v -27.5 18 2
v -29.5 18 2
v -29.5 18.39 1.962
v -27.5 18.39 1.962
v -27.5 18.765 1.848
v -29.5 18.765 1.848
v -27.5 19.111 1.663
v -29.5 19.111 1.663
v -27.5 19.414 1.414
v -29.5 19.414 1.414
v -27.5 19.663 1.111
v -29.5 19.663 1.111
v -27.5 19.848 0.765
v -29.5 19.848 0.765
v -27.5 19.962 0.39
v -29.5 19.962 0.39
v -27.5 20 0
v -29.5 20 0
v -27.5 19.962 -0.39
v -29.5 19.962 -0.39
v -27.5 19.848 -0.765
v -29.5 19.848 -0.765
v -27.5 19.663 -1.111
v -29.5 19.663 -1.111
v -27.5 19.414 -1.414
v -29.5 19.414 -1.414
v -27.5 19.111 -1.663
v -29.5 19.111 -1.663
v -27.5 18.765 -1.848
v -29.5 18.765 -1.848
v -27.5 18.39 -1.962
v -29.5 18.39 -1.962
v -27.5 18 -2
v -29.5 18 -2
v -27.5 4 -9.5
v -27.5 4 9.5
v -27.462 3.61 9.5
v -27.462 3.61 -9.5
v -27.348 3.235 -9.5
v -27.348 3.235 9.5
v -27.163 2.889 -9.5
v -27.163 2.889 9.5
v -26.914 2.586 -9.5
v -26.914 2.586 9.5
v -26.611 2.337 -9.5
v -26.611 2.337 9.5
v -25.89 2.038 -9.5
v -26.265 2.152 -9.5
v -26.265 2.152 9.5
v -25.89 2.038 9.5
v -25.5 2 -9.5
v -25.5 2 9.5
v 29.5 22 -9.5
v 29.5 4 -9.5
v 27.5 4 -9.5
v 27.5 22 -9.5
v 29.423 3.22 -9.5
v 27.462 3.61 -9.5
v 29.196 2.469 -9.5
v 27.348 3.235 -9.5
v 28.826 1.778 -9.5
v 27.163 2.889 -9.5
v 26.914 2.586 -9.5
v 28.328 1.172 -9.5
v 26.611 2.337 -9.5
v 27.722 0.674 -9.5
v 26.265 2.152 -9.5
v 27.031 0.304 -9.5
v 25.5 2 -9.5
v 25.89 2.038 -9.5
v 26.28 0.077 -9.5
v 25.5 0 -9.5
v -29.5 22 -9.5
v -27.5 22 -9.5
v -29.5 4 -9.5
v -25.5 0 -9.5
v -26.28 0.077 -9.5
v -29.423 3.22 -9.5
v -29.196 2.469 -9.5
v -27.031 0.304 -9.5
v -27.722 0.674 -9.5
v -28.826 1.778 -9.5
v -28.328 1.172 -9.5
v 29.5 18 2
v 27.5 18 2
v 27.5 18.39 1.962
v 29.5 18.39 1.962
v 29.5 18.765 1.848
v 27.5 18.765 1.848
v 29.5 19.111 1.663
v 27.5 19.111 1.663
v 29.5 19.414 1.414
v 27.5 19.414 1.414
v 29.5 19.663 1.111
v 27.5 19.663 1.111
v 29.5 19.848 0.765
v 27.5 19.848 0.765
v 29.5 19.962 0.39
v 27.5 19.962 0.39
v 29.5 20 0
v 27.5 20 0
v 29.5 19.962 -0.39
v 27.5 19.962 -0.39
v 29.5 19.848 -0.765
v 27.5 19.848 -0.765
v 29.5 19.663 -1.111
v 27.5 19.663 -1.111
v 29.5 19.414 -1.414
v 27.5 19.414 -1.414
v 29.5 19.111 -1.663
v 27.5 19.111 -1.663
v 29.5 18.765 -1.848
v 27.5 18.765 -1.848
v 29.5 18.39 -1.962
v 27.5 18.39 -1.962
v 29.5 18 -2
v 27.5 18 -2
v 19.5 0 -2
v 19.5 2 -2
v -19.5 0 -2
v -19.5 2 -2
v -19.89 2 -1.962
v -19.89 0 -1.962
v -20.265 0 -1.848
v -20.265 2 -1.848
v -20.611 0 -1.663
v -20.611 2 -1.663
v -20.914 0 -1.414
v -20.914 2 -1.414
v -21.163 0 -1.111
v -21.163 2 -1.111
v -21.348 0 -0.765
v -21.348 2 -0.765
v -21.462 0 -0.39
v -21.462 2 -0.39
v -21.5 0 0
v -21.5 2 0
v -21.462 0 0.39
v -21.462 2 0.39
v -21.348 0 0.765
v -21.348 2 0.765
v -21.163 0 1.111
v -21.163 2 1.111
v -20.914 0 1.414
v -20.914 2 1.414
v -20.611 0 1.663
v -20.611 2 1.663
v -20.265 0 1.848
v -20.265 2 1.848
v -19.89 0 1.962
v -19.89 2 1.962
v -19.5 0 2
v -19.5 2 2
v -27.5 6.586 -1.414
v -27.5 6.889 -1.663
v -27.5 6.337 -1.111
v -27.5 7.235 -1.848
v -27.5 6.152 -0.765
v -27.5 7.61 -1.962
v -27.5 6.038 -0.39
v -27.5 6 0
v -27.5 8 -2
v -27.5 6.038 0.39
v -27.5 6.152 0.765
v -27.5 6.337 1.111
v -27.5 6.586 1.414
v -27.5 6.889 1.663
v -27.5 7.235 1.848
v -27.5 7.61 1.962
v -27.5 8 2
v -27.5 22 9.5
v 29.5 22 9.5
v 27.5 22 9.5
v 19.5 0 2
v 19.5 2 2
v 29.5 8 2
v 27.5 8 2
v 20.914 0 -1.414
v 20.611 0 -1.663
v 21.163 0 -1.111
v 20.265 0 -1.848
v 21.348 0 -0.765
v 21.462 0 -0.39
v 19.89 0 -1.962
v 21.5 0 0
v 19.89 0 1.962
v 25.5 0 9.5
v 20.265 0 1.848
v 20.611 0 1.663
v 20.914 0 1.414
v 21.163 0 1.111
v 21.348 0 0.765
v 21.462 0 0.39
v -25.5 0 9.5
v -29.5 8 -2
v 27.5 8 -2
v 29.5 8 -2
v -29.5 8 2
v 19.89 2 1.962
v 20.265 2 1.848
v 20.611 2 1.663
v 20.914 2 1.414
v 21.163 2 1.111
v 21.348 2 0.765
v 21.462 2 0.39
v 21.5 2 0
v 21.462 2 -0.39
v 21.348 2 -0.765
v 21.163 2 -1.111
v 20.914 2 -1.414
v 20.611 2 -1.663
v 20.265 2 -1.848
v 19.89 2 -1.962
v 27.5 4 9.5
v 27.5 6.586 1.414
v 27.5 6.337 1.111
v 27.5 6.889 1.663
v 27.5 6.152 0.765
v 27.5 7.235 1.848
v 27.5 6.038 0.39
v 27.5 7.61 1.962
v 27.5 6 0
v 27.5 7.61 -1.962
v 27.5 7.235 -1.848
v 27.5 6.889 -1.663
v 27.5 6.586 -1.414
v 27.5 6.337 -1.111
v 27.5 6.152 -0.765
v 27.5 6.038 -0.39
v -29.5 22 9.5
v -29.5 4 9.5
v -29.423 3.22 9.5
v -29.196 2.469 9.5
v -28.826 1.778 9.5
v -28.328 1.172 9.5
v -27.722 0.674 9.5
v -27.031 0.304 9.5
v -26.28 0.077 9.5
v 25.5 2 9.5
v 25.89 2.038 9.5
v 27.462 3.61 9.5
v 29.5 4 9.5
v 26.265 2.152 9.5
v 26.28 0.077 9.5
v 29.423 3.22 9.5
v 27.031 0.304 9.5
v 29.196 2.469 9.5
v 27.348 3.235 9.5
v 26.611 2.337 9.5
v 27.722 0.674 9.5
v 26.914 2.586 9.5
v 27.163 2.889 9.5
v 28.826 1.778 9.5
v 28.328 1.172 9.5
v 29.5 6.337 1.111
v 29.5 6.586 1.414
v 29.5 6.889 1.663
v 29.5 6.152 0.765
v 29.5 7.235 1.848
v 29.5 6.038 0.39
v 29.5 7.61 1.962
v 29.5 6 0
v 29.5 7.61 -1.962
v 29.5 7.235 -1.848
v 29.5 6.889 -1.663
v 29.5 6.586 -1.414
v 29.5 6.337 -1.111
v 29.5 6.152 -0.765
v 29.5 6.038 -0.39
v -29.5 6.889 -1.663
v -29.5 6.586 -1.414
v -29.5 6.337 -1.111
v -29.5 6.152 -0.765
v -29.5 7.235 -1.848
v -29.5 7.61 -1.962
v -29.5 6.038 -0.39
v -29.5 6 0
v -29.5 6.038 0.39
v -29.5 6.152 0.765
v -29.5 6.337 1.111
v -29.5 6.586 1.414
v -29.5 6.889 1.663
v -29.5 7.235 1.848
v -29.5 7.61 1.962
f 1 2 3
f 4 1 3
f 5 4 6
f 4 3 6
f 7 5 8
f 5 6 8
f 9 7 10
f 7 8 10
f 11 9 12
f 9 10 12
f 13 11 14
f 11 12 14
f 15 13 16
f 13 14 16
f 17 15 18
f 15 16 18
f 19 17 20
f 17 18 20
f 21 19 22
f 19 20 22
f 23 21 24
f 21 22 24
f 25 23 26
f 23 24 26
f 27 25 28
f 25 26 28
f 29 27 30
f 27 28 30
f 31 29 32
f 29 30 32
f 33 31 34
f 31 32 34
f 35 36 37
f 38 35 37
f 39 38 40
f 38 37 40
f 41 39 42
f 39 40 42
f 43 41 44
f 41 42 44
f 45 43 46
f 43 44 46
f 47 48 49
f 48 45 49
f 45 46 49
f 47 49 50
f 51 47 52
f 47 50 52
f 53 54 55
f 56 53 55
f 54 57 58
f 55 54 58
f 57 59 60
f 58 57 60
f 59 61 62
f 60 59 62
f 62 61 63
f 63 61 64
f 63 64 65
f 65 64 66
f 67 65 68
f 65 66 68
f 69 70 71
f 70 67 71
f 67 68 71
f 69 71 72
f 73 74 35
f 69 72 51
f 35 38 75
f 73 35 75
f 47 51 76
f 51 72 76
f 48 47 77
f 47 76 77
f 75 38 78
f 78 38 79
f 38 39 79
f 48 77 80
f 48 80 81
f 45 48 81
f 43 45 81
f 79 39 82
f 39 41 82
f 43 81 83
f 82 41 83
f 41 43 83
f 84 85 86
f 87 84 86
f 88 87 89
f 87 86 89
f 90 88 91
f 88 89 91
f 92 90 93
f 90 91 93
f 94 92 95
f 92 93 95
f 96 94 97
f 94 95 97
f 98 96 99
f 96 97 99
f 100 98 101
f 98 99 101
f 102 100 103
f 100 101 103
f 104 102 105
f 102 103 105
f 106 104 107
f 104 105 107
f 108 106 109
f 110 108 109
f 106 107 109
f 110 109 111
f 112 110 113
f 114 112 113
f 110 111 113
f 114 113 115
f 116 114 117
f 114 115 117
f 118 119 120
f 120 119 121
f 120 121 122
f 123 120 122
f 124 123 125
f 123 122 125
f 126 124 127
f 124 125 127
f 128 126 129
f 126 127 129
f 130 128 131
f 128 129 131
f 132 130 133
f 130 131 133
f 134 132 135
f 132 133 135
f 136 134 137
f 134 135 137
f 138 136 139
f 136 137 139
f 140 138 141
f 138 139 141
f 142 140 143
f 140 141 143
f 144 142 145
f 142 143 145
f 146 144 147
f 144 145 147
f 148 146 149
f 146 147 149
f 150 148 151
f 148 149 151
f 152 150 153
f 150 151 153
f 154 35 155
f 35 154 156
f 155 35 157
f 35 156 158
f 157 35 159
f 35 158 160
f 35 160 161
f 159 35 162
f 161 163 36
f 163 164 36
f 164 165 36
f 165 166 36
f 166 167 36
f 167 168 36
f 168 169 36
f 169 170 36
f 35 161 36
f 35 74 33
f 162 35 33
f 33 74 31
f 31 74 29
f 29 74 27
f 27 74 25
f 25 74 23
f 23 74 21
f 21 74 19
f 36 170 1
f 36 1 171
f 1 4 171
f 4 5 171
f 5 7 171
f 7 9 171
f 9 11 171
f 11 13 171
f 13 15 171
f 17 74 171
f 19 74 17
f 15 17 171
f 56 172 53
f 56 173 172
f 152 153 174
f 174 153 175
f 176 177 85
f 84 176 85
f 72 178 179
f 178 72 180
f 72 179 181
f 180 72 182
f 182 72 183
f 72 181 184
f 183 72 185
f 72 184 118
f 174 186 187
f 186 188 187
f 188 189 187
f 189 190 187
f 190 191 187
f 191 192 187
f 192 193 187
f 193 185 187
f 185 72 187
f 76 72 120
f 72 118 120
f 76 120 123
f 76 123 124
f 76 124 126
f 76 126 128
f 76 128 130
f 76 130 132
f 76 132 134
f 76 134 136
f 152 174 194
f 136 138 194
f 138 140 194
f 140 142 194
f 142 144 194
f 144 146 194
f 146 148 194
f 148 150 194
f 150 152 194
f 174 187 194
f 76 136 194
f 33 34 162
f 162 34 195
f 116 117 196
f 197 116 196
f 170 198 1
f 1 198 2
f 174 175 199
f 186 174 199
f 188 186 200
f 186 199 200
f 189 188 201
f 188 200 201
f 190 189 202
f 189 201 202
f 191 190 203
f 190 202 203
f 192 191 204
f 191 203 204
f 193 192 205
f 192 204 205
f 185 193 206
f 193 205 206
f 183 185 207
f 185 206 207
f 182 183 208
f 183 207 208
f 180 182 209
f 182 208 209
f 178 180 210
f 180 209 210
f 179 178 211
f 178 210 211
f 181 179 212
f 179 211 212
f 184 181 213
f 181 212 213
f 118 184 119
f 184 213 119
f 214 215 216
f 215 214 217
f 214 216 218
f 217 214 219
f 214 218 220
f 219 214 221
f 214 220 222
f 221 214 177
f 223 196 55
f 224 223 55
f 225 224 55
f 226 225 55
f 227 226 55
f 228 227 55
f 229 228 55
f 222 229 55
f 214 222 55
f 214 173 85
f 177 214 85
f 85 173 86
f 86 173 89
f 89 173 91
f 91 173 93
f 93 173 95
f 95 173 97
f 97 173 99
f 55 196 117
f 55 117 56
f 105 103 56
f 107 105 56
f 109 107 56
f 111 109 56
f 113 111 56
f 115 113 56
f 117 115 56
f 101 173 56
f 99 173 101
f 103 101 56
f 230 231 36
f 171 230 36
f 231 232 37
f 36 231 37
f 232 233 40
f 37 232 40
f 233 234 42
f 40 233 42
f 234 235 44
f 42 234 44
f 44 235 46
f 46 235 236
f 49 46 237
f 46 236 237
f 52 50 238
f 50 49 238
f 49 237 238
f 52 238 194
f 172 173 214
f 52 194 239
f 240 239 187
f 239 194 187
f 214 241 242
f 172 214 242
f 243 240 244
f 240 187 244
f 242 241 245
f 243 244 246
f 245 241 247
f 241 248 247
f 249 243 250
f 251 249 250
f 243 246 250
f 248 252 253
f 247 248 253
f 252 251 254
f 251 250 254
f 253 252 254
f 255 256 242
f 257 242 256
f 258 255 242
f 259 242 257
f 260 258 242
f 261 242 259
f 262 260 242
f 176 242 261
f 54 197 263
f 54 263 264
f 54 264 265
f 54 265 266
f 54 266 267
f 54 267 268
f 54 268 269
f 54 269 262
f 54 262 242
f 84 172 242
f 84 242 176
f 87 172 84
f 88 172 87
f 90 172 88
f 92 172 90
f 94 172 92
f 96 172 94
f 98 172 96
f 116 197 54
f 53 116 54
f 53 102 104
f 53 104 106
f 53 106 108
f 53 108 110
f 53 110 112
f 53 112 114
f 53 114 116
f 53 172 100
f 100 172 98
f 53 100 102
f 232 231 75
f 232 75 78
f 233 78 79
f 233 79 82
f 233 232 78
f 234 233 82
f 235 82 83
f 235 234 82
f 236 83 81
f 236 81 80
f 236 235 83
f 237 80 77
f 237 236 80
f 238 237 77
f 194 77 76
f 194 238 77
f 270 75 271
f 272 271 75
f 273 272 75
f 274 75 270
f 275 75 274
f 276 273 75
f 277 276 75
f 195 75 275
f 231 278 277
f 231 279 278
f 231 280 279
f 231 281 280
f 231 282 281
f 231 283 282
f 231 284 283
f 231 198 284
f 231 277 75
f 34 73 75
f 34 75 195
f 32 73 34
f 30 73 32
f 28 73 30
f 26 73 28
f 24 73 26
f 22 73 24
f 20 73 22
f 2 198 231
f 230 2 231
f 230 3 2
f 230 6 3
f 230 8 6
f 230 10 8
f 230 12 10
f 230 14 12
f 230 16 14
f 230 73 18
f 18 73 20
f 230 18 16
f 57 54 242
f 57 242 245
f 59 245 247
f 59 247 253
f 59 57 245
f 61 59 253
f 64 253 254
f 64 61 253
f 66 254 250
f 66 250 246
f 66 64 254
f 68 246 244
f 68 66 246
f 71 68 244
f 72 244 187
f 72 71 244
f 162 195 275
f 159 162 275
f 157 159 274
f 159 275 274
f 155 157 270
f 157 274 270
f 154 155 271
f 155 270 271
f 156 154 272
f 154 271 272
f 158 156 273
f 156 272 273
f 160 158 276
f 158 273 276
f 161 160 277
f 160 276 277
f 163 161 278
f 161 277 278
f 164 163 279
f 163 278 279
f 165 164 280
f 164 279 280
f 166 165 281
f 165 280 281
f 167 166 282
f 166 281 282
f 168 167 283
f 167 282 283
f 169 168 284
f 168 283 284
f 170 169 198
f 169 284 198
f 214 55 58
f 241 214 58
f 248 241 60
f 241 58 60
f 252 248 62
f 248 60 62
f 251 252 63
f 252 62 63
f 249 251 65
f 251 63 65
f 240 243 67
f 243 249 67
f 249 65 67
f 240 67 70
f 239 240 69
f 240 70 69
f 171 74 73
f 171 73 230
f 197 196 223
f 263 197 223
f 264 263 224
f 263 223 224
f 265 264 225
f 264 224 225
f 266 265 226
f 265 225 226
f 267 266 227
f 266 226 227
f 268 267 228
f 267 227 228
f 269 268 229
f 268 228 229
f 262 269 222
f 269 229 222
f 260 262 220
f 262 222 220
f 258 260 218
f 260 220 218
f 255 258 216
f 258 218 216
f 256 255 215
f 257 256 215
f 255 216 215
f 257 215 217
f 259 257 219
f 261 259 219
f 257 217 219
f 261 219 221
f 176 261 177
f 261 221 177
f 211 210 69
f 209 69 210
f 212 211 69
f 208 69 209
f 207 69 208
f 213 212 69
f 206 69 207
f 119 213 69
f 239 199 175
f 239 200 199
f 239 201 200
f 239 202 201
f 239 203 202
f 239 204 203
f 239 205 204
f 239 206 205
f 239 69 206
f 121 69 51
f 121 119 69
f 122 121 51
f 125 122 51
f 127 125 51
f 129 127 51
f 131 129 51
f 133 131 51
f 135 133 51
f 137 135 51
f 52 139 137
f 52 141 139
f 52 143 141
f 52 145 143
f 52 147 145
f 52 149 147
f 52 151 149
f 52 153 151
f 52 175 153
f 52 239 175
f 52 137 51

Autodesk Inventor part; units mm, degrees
ref_plane "YZ Plane" through (0, 0, 0) normal (1, 0, 0) x (0, 1, 0)
ref_plane "XZ Plane" through (0, 0, 0) normal (0, 1, 0) x (-1, 0, 0)
ref_plane "XY Plane" through (0, 0, 0) normal (0, 0, 1) x (1, 0, 0)
sketch "スケッチ1" plane through (0, 0, 0) normal (0, 1, 0) x (-1, 0, 0)
  line L0 (-27.5, -9.5) -> (27.5, -9.5)
  line L1 (27.5, -9.5) -> (27.5, 9.5)
  line L2 (27.5, 9.5) -> (-27.5, 9.5)
  line L3 (-27.5, 9.5) -> (-27.5, -9.5)
  line L4 (-27.5, -9.5) -> (27.5, 9.5) construction
  line L5 (27.5, -9.5) -> (-27.5, 9.5) construction
  point P0 (0, 0)
  dimension "d0" = 19
  dimension "d1" = 55
extrude "プレート1" add sketch "スケッチ1" along normal blind 2
sketch "スケッチ2" plane through (27.5, 0, 9.5) normal (1, 0, 0) x (0, 0, -1)
  line L0 (0, 2) -> (19, 2)
  line L1 (19, 2) -> (0, 2)
  line L2 (0, 2) -> (0, 22)
  line L3 (0, 22) -> (19, 22)
  line L4 (19, 22) -> (19, 2)
  point P0 (9.5, 0)
  dimension "d3" = 20
sheet face with bend "面2" sketch "スケッチ2" thickness 2 toward (1, 0, 0) bend radius 2
bend "曲げ1"
sketch "スケッチ3" plane through (-27.5, 0, -9.5) normal (-1, 0, 0) x (0, 0, 1)
  line L0 (0, 0) -> (0, 2)
  line L1 (0, 22) -> (19, 22)
  line L2 (0, 2) -> (19, 2)
  line L3 (19, 2) -> (19, 22)
  line L4 (19, 22) -> (0, 22)
  line L5 (0, 22) -> (0, 2)
  point P0 (9.5, 0)
sheet face with bend "面3" sketch "スケッチ3" thickness 2 toward (-1, 0, 0) bend radius 2
bend "曲げ2"
sketch "スケッチ4" plane through (-29.5, 0, -9.5) normal (-1, 0, 0) x (0, 0, 1)
  line L0 (7.5, 18) -> (7.5, 8)
  arc A0 (7.5, 8) -> (11.5, 8) centre (9.5, 8) ccw
  line L1 (11.5, 8) -> (11.5, 18)
  arc A1 (11.5, 18) -> (7.5, 18) centre (9.5, 18) ccw
  line L2 (19, 22) -> (19, 4) projected
  line L3 (0, 22) -> (19, 22) projected
  line L4 (19, 4) -> (0, 4) projected
  point P0 (9.5, 0)
  dimension "d18" = 2
  dimension "d33" = 4
  dimension "d34" = 4
extrude "押し出し1" cut sketch "スケッチ4" against normal blind 100
sketch "スケッチ5" plane through (0, 2, 0) normal (0, 1, 0) x (1, 0, 0)
  line L0 (-19.5, -2) -> (19.5, -2)
  arc A0 (19.5, -2) -> (19.5, 2) centre (19.5, 0) ccw
  line L1 (19.5, 2) -> (-19.5, 2)
  arc A1 (-19.5, 2) -> (-19.5, -2) centre (-19.5, 0) ccw
  line L2 (25.5, -9.5) -> (-25.5, -9.5) projected
  line L3 (-25.5, 9.5) -> (-25.5, -9.5) projected
  line L4 (25.5, -9.5) -> (25.5, 9.5) projected
  point P0 (0, 0)
  point P1 (-21.5, 0)
  dimension "d22" = 2
  dimension "d35" = 6
  dimension "d36" = 6
extrude "押し出し2" cut sketch "スケッチ5" against normal blind 3
equation "\"d2\" = Thickness"
equation "\"d4\" = BendRadius"
equation "\"d5\" = BendReliefWidth"
equation "\"d7\" = MinimumRemnant"
equation "\"d6\" = BendReliefDepth"
equation "\"d8\" = TransitionRadius"
equation "\"d9\" = BendRadius"
equation "\"d10\" = BendReliefWidth"
equation "\"d12\" = MinimumRemnant"
equation "\"d11\" = BendReliefDepth"
equation "\"d13\" = TransitionRadius"
equation "\"BendRadius\" = Thickness"
equation "\"BendReliefWidth\" = Thickness"
equation "\"BendReliefDepth\" = 0.5 * Thickness"
equation "\"CornerReliefSize\" = 4 * Thickness"
equation "\"MinimumRemnant\" = 2 * Thickness"
equation "\"TransitionRadius\" = BendRadius"
equation "\"JacobiRadiusSize\" = BendRadius"
equation "\"GapSize\" = Thickness"
equation "\"Thickness\" = 2"
properties part number "thumbkey_cup" material "アルミニウム 6061"
